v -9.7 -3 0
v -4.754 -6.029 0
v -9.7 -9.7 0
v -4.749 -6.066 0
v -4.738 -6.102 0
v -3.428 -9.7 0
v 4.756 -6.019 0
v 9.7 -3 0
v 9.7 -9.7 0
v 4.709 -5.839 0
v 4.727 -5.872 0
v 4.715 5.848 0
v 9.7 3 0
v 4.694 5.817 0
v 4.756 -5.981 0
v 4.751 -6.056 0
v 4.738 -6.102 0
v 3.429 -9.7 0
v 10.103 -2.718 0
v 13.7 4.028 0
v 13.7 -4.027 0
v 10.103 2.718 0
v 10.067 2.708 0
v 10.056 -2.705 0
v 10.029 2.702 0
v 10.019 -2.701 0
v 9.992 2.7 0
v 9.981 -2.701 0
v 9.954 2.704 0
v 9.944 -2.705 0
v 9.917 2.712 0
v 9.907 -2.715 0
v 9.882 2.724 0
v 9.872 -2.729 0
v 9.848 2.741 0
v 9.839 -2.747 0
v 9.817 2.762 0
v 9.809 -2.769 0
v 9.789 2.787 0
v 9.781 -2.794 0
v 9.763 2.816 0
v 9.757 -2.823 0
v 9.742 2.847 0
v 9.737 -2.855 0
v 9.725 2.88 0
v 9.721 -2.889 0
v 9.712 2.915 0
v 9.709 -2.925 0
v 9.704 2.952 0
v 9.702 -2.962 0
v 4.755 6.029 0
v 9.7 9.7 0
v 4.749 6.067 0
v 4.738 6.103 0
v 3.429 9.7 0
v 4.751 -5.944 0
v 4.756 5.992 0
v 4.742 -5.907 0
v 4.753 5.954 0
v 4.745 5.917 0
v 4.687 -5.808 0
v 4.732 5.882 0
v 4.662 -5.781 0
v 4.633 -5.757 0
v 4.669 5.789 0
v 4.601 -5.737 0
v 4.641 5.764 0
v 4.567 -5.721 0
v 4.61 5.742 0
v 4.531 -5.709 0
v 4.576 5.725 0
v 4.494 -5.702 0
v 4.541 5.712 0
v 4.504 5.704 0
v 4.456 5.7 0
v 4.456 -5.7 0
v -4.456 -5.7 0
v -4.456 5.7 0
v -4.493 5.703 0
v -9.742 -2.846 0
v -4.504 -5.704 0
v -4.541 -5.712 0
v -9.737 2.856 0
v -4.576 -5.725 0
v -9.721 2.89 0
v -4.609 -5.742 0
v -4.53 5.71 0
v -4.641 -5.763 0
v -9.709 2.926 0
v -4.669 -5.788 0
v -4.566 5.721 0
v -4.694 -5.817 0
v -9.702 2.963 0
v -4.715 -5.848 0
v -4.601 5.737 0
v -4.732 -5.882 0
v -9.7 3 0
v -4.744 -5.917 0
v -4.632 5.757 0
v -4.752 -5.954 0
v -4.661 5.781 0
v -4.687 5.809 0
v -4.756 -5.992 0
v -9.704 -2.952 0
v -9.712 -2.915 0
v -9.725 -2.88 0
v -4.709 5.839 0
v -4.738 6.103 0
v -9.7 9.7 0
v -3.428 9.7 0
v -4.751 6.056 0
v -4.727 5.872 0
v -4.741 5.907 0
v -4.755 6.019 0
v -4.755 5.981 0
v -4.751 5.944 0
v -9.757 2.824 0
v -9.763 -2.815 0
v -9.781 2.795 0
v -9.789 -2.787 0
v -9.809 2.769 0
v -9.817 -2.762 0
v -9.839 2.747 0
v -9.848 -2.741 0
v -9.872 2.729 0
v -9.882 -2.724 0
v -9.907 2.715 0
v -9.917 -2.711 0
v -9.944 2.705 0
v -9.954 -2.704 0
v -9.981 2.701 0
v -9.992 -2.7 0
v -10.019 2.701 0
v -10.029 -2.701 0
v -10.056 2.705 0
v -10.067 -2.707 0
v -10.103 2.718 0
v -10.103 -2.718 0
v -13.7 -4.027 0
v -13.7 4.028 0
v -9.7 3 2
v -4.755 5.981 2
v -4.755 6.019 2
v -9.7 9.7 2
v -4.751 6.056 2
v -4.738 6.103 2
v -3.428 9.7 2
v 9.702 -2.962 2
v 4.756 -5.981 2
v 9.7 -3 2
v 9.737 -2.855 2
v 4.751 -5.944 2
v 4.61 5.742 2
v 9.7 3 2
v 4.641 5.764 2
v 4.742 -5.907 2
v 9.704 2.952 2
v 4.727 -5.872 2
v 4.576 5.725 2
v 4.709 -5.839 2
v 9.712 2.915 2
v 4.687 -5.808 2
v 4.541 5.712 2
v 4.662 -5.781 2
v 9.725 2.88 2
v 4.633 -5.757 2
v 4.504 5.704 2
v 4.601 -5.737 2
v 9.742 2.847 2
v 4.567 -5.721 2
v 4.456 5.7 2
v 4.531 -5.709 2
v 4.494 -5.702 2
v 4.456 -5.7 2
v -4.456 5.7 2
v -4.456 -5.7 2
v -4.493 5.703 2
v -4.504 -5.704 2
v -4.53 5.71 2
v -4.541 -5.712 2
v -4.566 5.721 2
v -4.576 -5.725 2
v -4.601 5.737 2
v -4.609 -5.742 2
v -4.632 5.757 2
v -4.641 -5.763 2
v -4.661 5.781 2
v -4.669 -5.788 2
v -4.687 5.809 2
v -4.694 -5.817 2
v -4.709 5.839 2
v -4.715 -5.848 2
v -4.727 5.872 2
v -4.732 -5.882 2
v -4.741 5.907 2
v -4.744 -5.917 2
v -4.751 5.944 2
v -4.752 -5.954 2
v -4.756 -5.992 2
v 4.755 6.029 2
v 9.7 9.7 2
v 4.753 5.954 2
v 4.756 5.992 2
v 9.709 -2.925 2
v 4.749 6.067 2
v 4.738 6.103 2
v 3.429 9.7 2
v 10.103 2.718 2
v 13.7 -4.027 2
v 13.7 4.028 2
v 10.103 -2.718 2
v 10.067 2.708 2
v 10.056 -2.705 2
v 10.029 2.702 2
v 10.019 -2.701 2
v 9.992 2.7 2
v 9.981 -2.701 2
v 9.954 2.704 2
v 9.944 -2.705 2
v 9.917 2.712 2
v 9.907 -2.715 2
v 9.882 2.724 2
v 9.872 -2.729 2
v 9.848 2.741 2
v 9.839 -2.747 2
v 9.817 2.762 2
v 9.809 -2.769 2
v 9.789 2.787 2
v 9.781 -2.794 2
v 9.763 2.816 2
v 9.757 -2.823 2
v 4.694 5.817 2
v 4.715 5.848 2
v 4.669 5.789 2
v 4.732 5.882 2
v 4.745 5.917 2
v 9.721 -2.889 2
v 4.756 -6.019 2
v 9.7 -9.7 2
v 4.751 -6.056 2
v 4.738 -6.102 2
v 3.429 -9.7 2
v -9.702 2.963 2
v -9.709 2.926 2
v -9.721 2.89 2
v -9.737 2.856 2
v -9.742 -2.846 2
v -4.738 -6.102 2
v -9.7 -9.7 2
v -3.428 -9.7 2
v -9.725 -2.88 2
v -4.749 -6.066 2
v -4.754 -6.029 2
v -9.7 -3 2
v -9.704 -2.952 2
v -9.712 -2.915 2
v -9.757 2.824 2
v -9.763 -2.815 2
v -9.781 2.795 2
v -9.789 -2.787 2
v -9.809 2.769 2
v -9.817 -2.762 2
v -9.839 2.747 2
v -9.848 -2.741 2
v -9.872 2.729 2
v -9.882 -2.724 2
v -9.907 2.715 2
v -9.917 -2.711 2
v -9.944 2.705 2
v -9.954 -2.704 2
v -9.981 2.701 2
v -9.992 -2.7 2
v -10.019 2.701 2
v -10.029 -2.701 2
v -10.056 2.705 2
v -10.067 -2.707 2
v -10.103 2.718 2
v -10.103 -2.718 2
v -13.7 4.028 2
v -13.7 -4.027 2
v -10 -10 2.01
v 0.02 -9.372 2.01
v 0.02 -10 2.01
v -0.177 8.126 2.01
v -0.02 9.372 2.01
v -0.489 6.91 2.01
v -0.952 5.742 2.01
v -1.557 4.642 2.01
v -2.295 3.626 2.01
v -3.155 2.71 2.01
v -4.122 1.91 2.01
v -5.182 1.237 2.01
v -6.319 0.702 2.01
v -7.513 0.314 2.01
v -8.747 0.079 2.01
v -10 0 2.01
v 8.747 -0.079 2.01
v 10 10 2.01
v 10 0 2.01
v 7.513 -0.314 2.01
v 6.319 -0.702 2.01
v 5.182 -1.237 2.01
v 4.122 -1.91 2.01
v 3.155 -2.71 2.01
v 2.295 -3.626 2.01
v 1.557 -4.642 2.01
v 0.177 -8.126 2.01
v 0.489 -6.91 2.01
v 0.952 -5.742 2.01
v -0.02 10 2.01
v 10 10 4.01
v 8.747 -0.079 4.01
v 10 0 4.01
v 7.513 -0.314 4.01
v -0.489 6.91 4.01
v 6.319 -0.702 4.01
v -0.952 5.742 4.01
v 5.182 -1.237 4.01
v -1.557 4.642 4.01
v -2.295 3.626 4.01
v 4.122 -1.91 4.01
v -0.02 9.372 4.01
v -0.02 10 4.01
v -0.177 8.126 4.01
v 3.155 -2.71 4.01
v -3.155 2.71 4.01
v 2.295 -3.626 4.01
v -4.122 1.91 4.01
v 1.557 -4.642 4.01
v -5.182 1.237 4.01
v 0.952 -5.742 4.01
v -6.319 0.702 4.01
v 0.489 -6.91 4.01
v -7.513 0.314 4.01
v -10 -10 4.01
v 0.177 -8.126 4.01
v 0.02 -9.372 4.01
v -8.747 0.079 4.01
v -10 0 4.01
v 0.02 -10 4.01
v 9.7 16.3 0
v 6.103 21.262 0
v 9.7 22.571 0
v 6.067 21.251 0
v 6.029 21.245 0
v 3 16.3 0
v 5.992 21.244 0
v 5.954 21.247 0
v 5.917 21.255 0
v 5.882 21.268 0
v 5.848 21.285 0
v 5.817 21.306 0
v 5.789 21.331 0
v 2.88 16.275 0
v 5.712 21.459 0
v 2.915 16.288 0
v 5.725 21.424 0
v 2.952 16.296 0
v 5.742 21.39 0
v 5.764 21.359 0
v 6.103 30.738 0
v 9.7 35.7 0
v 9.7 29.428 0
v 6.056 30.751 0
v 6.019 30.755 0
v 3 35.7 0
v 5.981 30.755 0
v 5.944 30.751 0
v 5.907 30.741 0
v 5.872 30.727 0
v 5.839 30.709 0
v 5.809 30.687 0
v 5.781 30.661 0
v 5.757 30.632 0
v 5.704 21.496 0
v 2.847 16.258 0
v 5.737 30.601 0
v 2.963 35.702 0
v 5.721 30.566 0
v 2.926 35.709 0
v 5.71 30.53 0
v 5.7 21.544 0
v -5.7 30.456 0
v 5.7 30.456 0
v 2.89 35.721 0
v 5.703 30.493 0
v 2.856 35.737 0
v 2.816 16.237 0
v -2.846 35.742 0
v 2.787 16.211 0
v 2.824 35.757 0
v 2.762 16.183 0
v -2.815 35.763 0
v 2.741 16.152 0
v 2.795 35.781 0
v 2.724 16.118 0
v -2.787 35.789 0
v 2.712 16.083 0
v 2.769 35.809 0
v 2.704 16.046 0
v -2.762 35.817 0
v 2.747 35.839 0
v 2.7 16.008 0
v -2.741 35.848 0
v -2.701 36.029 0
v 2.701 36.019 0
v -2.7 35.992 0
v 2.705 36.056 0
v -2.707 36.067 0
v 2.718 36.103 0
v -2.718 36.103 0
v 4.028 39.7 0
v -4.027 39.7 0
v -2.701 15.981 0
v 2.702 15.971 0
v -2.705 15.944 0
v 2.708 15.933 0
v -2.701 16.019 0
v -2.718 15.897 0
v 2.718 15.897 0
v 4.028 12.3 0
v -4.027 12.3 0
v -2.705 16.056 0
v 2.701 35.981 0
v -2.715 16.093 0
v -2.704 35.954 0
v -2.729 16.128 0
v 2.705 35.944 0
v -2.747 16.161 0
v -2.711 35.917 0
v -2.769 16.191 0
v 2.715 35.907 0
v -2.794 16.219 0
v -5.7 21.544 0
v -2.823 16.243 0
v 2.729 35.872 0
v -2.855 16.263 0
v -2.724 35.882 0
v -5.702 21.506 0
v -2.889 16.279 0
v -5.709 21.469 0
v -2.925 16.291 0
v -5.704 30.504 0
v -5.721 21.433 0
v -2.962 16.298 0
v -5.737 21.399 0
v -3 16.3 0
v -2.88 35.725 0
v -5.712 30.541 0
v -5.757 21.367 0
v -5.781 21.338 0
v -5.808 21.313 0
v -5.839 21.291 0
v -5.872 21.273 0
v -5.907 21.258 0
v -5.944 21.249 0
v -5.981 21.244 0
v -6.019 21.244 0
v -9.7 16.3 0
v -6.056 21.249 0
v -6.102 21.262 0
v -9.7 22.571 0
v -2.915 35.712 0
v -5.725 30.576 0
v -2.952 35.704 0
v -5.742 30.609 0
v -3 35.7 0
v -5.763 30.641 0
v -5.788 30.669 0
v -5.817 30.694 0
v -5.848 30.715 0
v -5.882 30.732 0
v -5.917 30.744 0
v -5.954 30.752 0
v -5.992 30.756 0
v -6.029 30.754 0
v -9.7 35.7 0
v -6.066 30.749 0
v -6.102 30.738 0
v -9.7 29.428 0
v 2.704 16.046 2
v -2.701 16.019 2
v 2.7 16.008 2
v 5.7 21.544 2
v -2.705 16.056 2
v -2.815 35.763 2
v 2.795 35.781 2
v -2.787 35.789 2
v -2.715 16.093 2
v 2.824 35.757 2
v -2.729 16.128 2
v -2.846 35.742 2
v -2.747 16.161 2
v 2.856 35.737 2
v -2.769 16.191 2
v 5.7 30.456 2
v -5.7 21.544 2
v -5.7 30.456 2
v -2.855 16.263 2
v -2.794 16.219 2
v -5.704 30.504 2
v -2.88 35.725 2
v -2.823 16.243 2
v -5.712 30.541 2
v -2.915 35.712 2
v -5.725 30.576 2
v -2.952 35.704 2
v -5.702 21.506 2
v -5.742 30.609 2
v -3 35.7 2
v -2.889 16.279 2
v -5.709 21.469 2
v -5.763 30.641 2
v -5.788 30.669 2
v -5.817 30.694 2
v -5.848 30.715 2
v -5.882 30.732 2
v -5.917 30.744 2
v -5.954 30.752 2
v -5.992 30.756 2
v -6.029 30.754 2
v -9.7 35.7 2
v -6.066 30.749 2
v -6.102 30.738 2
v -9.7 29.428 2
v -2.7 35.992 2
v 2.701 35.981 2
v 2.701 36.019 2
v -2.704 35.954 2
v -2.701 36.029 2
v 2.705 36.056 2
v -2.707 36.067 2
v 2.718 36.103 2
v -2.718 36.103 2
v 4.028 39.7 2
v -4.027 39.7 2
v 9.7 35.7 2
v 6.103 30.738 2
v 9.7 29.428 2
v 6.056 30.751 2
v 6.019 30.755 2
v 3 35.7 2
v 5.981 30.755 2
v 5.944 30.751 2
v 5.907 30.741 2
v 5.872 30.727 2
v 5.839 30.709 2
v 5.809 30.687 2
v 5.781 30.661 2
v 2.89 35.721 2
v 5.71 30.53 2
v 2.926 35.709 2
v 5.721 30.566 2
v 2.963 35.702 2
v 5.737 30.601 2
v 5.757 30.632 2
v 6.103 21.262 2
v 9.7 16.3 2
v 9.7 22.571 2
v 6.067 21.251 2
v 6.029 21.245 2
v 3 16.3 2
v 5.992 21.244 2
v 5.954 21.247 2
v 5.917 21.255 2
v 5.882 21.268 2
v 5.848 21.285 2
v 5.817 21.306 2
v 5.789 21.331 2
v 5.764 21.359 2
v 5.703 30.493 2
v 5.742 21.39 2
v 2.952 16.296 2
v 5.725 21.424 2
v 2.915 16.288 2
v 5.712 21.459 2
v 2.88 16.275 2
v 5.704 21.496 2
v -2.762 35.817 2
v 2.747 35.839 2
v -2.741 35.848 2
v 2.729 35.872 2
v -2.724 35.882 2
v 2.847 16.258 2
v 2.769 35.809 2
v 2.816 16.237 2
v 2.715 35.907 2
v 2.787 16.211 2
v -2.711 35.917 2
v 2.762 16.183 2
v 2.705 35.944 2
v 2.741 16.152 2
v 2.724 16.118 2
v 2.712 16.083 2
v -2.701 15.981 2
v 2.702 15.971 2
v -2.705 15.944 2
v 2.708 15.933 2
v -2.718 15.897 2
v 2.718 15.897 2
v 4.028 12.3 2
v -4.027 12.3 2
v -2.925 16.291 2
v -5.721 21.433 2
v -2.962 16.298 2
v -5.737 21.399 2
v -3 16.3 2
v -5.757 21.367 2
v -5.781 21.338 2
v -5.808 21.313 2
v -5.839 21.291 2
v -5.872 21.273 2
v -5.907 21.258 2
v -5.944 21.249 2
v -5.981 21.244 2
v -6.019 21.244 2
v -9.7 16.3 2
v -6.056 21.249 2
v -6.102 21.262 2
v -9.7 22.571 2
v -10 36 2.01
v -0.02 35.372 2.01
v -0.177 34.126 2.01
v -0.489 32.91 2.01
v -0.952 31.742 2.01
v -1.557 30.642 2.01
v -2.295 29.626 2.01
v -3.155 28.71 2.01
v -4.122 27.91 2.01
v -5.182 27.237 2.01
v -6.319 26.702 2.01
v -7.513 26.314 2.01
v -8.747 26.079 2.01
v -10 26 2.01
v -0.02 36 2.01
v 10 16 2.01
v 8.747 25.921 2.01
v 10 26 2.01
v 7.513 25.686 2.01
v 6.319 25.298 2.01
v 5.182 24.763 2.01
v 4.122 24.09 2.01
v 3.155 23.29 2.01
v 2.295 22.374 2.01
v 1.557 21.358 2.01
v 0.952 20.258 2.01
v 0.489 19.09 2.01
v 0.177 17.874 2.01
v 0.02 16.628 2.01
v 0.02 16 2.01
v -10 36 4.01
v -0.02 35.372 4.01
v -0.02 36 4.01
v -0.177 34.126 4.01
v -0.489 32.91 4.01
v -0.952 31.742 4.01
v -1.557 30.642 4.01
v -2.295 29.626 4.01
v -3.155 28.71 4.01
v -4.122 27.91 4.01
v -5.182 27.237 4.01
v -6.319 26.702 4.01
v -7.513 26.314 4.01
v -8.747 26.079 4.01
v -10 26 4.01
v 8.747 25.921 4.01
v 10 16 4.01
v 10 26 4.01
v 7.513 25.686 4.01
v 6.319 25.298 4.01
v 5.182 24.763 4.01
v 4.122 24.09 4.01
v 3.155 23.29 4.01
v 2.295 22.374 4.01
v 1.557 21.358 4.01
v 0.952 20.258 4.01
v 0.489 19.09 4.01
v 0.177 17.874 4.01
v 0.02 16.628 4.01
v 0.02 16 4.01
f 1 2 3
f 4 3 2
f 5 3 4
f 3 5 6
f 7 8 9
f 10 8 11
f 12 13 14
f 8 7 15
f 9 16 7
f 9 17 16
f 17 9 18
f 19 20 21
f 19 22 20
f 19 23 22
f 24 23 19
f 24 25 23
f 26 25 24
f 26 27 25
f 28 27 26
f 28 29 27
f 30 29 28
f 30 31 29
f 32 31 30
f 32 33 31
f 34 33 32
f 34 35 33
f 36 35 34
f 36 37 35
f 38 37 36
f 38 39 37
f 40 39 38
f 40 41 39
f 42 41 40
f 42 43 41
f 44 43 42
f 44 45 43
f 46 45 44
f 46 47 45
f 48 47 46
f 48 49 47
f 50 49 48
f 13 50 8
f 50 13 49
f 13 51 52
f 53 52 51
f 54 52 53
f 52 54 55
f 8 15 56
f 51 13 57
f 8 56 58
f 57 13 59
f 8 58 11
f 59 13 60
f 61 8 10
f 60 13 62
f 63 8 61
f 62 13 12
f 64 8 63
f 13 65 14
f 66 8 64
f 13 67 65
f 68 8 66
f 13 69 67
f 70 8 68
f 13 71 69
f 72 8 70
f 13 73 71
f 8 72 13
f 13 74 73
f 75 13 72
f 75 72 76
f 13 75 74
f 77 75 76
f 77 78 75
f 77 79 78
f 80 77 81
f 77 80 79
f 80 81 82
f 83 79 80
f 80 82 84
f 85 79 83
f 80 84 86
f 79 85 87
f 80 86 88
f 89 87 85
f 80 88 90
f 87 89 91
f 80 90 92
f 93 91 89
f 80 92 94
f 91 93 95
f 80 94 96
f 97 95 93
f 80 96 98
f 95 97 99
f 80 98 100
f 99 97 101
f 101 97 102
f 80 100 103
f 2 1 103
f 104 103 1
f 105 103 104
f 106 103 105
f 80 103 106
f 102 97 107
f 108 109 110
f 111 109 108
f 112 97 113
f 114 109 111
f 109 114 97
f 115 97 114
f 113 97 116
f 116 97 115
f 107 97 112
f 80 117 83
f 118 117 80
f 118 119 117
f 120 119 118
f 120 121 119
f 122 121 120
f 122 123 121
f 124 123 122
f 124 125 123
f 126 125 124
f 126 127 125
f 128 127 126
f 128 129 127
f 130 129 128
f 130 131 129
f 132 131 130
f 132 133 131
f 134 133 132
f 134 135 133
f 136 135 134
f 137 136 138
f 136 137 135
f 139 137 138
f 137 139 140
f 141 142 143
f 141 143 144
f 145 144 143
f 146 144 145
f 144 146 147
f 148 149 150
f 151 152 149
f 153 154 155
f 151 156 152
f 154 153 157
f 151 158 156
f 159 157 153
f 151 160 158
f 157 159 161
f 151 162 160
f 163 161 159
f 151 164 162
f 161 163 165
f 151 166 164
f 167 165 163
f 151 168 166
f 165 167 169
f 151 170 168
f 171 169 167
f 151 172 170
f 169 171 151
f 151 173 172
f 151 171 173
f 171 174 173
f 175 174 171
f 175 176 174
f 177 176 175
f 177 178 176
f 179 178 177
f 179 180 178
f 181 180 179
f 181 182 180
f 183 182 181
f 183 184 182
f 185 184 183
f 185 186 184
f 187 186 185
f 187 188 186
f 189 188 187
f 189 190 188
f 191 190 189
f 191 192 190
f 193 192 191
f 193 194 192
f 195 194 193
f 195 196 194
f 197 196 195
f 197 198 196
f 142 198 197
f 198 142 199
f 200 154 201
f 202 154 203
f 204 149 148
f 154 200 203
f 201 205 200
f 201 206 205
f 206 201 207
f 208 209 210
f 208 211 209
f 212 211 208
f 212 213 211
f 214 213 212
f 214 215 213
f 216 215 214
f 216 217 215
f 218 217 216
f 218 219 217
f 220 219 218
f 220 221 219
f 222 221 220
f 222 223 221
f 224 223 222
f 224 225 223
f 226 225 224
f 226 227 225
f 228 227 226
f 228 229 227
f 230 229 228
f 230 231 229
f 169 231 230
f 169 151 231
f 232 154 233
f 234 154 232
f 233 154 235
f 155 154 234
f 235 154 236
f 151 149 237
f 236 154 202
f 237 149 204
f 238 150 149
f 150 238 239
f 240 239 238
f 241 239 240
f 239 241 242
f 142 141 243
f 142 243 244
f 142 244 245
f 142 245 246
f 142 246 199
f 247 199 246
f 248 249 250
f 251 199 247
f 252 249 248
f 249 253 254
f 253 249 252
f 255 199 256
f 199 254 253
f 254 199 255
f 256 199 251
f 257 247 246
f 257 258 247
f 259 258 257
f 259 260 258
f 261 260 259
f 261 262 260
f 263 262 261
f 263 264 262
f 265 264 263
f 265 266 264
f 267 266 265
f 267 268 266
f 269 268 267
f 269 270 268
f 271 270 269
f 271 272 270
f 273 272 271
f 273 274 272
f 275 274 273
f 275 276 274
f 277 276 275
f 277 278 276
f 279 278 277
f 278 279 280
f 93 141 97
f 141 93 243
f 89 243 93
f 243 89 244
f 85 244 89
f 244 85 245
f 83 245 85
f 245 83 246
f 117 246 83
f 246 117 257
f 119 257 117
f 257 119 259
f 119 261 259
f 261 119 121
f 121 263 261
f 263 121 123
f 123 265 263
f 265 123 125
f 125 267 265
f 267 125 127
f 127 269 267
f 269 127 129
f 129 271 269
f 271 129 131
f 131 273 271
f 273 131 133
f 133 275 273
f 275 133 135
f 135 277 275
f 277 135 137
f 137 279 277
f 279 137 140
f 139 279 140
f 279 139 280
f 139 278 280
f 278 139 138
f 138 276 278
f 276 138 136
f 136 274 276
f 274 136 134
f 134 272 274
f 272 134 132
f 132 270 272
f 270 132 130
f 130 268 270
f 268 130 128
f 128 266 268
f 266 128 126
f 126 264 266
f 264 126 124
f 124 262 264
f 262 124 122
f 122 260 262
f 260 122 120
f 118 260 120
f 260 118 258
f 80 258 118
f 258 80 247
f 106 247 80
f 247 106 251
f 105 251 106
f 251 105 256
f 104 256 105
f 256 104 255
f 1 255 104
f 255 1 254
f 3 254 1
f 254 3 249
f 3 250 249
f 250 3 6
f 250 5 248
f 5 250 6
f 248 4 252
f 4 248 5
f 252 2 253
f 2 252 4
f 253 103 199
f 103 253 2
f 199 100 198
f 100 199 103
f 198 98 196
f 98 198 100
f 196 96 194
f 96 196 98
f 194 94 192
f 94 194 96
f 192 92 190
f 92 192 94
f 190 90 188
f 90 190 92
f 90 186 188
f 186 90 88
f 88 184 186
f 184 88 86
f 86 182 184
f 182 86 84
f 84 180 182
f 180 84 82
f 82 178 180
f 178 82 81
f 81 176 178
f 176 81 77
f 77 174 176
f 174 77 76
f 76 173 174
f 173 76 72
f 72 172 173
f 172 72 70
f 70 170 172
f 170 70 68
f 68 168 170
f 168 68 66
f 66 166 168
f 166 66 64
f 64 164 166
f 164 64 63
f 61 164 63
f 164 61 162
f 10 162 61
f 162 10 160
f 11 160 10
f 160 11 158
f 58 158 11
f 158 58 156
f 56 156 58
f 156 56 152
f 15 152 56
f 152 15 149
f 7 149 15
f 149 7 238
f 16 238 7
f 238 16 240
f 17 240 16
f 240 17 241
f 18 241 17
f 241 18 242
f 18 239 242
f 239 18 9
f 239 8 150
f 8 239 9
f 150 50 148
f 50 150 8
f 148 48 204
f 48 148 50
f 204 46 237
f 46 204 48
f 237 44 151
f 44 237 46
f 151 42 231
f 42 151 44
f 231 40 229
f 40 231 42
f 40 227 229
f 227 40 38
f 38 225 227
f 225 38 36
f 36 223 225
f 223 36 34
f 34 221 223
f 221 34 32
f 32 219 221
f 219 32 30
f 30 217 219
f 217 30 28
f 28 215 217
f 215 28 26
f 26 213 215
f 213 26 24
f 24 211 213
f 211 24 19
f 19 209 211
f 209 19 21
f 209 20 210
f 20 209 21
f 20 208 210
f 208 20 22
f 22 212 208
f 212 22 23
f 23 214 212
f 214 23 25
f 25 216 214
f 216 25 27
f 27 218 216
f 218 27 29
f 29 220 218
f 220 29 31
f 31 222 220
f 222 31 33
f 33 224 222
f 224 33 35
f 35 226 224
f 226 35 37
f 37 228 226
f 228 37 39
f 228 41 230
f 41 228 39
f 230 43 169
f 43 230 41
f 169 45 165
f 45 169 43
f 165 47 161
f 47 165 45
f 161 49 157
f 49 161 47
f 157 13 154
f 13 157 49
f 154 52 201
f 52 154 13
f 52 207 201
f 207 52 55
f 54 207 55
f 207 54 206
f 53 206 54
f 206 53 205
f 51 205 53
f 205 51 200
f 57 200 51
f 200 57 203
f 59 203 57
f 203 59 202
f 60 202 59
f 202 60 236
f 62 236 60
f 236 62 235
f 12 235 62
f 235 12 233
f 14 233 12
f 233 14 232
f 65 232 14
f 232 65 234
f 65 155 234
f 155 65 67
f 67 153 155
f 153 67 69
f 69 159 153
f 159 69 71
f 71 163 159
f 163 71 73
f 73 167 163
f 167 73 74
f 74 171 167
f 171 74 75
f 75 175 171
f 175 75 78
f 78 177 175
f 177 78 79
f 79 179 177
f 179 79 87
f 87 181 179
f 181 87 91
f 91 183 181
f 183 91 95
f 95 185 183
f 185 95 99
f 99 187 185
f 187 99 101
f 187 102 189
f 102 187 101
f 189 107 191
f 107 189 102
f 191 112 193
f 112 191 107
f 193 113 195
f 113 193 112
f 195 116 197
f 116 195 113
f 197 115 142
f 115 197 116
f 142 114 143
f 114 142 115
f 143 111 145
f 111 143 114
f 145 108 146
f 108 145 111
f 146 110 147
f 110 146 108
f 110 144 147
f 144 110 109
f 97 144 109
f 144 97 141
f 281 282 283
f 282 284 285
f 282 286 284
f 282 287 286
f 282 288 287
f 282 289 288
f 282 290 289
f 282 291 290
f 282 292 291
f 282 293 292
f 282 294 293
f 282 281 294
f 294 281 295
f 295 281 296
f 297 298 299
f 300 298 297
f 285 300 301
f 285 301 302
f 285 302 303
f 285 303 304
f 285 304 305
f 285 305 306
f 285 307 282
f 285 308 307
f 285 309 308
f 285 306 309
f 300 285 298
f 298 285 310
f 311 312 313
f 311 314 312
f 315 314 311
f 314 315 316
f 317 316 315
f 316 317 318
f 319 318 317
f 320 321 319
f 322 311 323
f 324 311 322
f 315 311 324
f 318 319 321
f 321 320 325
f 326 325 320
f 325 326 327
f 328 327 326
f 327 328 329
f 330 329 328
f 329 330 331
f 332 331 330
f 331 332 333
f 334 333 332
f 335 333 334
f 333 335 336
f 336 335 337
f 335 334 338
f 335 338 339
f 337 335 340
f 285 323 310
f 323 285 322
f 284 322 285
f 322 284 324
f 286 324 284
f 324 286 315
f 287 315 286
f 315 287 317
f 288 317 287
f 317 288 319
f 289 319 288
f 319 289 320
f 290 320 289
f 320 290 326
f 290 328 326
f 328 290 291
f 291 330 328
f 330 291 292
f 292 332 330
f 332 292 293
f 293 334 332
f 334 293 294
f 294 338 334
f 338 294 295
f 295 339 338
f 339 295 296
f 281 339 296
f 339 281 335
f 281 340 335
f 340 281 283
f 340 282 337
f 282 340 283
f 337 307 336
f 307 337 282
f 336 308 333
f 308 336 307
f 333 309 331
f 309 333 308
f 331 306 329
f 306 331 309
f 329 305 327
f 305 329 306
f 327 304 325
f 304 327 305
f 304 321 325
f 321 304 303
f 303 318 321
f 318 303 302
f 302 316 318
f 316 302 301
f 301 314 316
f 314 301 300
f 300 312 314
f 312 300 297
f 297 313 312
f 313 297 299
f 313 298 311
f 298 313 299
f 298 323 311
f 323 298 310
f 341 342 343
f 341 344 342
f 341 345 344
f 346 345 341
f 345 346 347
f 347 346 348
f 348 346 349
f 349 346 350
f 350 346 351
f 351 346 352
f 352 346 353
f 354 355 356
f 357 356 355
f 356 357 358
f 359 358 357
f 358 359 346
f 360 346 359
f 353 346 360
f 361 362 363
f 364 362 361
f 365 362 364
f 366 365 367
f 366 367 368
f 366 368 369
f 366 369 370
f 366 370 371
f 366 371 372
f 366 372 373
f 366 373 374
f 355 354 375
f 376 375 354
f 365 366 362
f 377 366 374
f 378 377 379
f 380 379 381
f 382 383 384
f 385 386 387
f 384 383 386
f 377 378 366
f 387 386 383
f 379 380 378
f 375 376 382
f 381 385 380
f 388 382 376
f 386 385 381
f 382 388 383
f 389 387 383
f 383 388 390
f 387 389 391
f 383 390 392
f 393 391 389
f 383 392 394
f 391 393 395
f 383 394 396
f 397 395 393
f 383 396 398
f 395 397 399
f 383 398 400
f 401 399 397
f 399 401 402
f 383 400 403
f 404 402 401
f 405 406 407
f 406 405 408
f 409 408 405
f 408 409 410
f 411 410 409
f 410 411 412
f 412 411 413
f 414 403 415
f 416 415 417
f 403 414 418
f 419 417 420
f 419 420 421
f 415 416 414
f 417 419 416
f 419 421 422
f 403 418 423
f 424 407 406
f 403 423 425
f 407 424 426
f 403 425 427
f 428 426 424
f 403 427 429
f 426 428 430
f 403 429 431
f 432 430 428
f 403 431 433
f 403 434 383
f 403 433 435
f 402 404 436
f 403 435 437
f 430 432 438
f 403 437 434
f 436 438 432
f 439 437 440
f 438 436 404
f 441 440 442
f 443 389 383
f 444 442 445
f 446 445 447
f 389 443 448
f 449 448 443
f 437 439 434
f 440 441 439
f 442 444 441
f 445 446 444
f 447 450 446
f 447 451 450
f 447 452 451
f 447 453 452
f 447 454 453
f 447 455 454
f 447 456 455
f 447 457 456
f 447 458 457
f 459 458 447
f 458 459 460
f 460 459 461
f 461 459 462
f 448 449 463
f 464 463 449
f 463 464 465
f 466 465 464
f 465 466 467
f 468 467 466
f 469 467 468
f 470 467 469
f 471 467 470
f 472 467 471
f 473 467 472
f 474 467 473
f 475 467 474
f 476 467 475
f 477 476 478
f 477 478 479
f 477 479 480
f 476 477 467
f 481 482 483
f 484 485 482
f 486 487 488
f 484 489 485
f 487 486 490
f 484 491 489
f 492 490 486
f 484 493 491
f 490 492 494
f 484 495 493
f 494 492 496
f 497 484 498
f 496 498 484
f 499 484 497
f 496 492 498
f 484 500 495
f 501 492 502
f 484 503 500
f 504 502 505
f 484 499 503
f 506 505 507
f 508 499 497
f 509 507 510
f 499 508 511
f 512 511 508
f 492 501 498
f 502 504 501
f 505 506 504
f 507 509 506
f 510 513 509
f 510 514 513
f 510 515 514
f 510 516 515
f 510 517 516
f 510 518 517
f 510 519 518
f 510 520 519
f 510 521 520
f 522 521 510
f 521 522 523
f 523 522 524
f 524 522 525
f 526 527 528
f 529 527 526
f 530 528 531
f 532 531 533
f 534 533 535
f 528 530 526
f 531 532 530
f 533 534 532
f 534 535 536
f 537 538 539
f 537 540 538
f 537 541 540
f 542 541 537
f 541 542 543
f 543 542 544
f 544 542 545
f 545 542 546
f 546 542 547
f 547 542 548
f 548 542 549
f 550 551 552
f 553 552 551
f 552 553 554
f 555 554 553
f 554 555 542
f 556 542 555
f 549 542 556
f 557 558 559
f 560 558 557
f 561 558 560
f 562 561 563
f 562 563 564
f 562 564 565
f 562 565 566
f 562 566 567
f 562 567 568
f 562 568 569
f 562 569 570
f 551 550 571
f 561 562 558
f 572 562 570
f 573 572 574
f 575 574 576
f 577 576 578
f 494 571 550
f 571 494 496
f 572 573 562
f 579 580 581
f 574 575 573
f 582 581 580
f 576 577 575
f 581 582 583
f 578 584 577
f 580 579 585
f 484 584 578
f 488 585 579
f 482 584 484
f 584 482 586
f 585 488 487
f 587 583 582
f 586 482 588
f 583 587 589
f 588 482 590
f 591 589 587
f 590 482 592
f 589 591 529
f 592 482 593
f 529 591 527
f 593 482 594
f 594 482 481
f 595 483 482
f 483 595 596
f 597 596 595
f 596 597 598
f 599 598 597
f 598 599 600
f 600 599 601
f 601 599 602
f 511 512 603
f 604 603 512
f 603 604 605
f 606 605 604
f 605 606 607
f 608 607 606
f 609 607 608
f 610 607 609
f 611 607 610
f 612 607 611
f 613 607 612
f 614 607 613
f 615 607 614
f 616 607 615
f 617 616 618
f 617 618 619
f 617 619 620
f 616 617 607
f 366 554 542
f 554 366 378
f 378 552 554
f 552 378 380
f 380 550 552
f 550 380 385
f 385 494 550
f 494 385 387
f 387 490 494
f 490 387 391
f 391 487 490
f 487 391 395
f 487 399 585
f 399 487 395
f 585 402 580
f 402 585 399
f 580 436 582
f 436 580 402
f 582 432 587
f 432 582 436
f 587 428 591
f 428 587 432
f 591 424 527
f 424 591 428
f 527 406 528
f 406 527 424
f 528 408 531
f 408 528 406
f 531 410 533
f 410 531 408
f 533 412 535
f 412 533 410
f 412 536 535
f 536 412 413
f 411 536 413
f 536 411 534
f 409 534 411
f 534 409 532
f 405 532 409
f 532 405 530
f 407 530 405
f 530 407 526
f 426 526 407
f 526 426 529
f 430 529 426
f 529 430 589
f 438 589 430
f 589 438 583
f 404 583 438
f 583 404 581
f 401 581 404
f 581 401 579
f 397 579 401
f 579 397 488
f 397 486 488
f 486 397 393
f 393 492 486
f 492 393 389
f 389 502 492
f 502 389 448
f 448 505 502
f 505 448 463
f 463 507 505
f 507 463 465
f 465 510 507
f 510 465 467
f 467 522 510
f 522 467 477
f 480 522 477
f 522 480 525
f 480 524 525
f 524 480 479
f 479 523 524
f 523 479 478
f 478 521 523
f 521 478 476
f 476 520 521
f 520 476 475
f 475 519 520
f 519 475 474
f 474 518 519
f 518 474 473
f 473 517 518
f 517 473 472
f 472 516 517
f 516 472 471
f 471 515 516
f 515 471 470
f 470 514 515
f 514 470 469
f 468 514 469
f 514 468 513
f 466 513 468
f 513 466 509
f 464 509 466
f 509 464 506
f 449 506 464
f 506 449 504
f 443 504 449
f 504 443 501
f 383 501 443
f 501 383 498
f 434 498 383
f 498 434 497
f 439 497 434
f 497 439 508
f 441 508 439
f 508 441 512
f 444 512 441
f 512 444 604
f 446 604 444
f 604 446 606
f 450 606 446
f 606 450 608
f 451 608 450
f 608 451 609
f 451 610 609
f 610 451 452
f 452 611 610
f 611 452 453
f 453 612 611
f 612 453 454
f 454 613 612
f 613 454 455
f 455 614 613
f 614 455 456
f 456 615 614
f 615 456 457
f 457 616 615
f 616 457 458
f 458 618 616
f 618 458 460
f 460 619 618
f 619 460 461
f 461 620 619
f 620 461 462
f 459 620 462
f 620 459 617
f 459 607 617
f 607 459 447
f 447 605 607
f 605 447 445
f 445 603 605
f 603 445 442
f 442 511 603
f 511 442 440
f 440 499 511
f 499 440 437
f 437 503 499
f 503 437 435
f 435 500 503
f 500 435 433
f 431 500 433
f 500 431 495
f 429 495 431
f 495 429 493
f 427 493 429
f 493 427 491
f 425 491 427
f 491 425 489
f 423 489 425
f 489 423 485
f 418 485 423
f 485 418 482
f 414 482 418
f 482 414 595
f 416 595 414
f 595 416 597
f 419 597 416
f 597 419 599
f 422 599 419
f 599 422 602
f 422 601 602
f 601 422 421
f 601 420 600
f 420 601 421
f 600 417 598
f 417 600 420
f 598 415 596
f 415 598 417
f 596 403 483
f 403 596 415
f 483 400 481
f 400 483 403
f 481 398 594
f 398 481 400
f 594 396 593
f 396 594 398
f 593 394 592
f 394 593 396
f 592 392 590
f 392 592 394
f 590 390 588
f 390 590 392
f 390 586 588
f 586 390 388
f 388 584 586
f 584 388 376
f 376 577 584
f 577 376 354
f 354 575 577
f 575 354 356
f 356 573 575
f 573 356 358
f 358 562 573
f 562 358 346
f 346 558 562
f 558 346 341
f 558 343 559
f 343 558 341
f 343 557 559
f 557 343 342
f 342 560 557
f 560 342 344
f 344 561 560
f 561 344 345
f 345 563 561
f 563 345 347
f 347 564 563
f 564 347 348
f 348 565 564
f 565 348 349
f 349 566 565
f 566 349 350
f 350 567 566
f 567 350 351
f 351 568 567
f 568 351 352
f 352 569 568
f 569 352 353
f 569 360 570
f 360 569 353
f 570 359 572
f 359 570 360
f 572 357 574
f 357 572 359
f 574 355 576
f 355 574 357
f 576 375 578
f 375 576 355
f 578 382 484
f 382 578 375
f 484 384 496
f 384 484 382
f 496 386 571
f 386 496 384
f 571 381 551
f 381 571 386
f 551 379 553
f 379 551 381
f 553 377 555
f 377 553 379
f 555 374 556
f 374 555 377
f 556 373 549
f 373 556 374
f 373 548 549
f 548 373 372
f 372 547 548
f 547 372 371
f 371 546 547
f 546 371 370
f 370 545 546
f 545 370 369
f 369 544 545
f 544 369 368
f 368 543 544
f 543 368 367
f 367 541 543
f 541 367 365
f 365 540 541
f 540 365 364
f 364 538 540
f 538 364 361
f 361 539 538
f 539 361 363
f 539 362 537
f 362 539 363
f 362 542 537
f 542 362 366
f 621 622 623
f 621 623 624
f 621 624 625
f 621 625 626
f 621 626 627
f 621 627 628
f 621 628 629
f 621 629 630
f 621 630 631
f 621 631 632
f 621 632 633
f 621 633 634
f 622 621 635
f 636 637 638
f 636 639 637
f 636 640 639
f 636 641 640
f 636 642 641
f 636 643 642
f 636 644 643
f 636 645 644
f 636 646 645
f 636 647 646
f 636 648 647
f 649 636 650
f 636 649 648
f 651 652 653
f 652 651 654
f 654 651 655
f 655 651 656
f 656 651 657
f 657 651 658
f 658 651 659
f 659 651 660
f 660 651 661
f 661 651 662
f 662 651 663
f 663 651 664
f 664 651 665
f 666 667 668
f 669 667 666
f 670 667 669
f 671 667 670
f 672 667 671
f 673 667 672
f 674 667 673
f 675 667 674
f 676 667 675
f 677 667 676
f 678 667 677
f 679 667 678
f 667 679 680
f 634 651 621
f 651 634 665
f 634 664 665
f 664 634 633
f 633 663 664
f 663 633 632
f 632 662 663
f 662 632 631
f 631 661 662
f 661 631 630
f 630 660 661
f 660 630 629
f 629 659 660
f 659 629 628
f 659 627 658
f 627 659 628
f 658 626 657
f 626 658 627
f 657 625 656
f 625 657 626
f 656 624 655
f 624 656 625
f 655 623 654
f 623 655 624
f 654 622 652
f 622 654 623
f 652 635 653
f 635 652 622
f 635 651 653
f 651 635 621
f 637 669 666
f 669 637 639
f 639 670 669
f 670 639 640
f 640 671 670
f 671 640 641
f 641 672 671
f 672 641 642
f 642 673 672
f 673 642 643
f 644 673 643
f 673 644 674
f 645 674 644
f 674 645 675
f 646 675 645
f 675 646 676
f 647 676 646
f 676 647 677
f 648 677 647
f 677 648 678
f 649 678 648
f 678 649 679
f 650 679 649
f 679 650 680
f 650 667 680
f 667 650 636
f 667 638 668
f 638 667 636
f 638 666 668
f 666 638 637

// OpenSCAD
// length of tile side in mm
size=20;
// grid X size
n=1;
// grid Y size
m=2;
// tile separation ratio
sep=0.3;
//tile inset for interference fit
inset=0.3;
// 0 plain base 1 base is tabbed 
Base=1;
//base height in mm
base_height=2;
// truchet height
truchet_height=2;

module plain_tile() {
    square([1,1]);
}

module asym_tabbed_tile() {
    
function asym_tab_in(tab_ratio,angle,inset) =
   [
   [(1-tab_ratio)/2,angle],
   [inset/sin(angle),360-angle],
   [2*inset/tan(angle)+tab_ratio, 360-angle],
   [inset/sin(angle),angle],
   [(1-tab_ratio)/2,90]
   ];
    
function asym_tab_out(tab_ratio,angle,inset) =
   [
   [(1-tab_ratio)/2,360-angle],
   [inset/sin(angle),angle],
   [2*inset/tan(angle)+tab_ratio, angle],
   [inset/sin(angle),360-angle],
   [(1-tab_ratio)/2,90]
   ];
function peri_to_points(peri,pos=[0,0],dir=0,i=0) =
    i == len(peri)
      ? [pos]
      : let (side = peri[i])
        let (distance = side[0])
        let (newpos = pos + distance* [cos(dir), sin(dir)])
        let (angle = side[1])
        let (newdir = dir + (180 - angle))
        concat([pos],peri_to_points(peri,newpos,newdir,i+1)) 
     ;                 

function peri_to_tile(peri,last=false) = 
    let (p = peri_to_points(peri))  
    last 
       ? [for (i=[0:len(p)-1]) p[i]] 
       : [for (i=[0:len(p)-2]) p[i]]; 
           
angle=70;
width=0.3;
depth=0.2;

pt = 
    concat(asym_tab_in(width,angle,depth),
     asym_tab_out(width,angle,depth),
     asym_tab_in(width,angle,depth),
     asym_tab_out(width,angle,depth)
    );
 
tabbed_tile= peri_to_tile(pt);
offset(-inset/size) 
  polygon(tabbed_tile);
}

module anti_truchet(size,d,h) {
    r=size/2;
    color("green")
    linear_extrude(height=d)
//         square([size,size], center=true);
             translate([-size/2,-size/2,0])
                 scale(size) 
                   if (Base==1)
                        asym_tabbed_tile();
                   else plain_tile();
    translate([0,0,d+eps])
    color("red")
    linear_extrude(height=h) 
    intersection() {
      square([size,size], center=true);
      union() {
         translate([size/2,size/2]) circle(r=r);
         translate([-size/2,-size/2]) circle(r=r);      
     }
   }
}

module truchet(size,d,h) {
   r=size/2;
   color("green")
    linear_extrude(height=d)
 //        square([size,size], center=true);
           rotate([0,0,90])
             translate([-size/2,-size/2,0])
               scale(size) 
                   if (Base==1)
                        asym_tabbed_tile();
                   else plain_tile();
   translate([0,0,d+eps])
   color("red")
   linear_extrude(height=h) 
    difference() {
      square([size,size], center=true);
      union() {
         translate([size/2,size/2]) circle(r=r);
         translate([-size/2,-size/2]) circle(r=r);
      }
   }
}

function random_tiles(N,M,i=0,tiles=[]) =
   len(tiles) < N*M
      ? let(r=rands(0,1,1)[0])
        let(j= r < 0.5 ? 1 : 3)
        let(l =
          i==0 
            ? 0 
            : i%N==0 
               ? (floor(i/N) -1)*N 
               : i-1)
        let(last = i==0? 0 :tiles[l])
        let(k=(last+j)%4)
        random_tiles(N,M,i+1,concat(tiles,k))
      : tiles;

module truchet_tile(size,d,h,form) {
   if(form==0)
      truchet(size,d,h);
   else if (form==1)
      rotate([0,0,90])
         truchet(size,d,h);
   else if (form==2)
      rotate([0,0,90])
         anti_truchet(size,d,h);
   else if (form==3)           
      anti_truchet(size,d,h,90);
}

module truchet_tiling(size,d,h,tiles,N,M,sep=0) {
    offset = 1+sep;
    for (i=[0:M-1]) 
    for (j = [0:N-1]) {
        form=tiles[i*N+j];
 //       color(colors[(i+2*j)%4])
        translate([j*size*offset,i*size*offset,0])
          truchet_tile(size,d,h,form); 
    }
}
  

eps=0.01;
$fn=50;
tiles = random_tiles(n,m);
//echo(rt);
truchet_tiling(size,base_height,truchet_height,tiles,n,m,sep);
